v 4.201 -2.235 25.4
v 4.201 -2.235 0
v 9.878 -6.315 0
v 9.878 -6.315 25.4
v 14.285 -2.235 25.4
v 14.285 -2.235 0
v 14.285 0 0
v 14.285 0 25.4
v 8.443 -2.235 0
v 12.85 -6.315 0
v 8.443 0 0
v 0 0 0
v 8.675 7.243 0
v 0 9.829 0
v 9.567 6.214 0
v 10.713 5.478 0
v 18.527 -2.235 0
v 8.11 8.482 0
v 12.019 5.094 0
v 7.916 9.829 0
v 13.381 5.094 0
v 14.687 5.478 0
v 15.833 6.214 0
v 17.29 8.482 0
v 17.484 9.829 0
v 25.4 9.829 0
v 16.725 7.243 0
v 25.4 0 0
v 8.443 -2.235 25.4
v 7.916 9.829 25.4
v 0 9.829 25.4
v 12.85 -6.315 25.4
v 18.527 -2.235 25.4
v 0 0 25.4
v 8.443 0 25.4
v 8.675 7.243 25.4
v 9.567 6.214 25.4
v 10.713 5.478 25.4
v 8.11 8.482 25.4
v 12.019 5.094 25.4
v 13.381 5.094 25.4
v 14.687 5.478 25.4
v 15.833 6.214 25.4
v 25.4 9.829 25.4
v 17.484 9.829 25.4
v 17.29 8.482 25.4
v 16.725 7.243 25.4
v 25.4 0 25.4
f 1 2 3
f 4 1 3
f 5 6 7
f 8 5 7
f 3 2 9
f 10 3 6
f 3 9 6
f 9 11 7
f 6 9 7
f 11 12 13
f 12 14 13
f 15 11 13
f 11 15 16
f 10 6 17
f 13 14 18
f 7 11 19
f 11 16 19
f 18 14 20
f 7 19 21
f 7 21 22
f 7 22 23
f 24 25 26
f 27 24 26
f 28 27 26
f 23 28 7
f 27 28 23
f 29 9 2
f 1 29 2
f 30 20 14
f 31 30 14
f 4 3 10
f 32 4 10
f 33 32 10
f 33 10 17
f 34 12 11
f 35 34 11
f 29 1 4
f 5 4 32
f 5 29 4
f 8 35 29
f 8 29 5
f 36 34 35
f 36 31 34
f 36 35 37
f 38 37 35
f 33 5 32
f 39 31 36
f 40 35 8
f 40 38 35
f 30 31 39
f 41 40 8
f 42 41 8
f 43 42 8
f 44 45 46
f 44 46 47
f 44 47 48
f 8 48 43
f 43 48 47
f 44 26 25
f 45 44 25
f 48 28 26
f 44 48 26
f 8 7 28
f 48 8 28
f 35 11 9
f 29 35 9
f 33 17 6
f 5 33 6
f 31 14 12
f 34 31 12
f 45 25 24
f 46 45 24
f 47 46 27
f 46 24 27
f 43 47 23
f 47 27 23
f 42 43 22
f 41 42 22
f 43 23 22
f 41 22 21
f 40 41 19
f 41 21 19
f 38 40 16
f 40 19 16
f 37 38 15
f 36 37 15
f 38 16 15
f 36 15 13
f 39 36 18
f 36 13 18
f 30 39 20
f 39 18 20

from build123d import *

# Parameters (mm, degrees)
BOSS_EXTRUDE1_DEPTH = 25.4


with BuildPart() as part:
    # Sketch1 → Boss-Extrude1 (new body)
    with BuildSketch(Plane.XY):
        with BuildLine():
            Line((0, 0), (8.443048692, 0))
            Line((8.443048692, 0), (8.443048692, -2.2352))
            Line((8.443048692, -2.2352), (4.201248692, -2.2352))
            Line((4.201248692, -2.2352), (9.878148692, -6.315260883))
            Line((9.878148692, -6.315260883), (12.849948692, -6.315260883))
            Line((12.849948692, -6.315260883), (18.526848692, -2.2352))
            Line((18.526848692, -2.2352), (14.285048692, -2.2352))
            Line((14.285048692, -2.2352), (14.285048692, 0))
            Line((14.285048692, 0), (25.4, 0))
            Line((25.4, 0), (25.4, 9.829452055))
            Line((25.4, 9.829452055), (17.484246575, 9.829452055))
            ThreePointArc((17.484246575, 9.829452055), (12.7, 5.045205479), (7.915753425, 9.829452055))
            Line((7.915753425, 9.829452055), (0, 9.829452055))
            Line((0, 9.829452055), (0, 0))
        make_face()
    extrude(amount=BOSS_EXTRUDE1_DEPTH)


solid = part.part
